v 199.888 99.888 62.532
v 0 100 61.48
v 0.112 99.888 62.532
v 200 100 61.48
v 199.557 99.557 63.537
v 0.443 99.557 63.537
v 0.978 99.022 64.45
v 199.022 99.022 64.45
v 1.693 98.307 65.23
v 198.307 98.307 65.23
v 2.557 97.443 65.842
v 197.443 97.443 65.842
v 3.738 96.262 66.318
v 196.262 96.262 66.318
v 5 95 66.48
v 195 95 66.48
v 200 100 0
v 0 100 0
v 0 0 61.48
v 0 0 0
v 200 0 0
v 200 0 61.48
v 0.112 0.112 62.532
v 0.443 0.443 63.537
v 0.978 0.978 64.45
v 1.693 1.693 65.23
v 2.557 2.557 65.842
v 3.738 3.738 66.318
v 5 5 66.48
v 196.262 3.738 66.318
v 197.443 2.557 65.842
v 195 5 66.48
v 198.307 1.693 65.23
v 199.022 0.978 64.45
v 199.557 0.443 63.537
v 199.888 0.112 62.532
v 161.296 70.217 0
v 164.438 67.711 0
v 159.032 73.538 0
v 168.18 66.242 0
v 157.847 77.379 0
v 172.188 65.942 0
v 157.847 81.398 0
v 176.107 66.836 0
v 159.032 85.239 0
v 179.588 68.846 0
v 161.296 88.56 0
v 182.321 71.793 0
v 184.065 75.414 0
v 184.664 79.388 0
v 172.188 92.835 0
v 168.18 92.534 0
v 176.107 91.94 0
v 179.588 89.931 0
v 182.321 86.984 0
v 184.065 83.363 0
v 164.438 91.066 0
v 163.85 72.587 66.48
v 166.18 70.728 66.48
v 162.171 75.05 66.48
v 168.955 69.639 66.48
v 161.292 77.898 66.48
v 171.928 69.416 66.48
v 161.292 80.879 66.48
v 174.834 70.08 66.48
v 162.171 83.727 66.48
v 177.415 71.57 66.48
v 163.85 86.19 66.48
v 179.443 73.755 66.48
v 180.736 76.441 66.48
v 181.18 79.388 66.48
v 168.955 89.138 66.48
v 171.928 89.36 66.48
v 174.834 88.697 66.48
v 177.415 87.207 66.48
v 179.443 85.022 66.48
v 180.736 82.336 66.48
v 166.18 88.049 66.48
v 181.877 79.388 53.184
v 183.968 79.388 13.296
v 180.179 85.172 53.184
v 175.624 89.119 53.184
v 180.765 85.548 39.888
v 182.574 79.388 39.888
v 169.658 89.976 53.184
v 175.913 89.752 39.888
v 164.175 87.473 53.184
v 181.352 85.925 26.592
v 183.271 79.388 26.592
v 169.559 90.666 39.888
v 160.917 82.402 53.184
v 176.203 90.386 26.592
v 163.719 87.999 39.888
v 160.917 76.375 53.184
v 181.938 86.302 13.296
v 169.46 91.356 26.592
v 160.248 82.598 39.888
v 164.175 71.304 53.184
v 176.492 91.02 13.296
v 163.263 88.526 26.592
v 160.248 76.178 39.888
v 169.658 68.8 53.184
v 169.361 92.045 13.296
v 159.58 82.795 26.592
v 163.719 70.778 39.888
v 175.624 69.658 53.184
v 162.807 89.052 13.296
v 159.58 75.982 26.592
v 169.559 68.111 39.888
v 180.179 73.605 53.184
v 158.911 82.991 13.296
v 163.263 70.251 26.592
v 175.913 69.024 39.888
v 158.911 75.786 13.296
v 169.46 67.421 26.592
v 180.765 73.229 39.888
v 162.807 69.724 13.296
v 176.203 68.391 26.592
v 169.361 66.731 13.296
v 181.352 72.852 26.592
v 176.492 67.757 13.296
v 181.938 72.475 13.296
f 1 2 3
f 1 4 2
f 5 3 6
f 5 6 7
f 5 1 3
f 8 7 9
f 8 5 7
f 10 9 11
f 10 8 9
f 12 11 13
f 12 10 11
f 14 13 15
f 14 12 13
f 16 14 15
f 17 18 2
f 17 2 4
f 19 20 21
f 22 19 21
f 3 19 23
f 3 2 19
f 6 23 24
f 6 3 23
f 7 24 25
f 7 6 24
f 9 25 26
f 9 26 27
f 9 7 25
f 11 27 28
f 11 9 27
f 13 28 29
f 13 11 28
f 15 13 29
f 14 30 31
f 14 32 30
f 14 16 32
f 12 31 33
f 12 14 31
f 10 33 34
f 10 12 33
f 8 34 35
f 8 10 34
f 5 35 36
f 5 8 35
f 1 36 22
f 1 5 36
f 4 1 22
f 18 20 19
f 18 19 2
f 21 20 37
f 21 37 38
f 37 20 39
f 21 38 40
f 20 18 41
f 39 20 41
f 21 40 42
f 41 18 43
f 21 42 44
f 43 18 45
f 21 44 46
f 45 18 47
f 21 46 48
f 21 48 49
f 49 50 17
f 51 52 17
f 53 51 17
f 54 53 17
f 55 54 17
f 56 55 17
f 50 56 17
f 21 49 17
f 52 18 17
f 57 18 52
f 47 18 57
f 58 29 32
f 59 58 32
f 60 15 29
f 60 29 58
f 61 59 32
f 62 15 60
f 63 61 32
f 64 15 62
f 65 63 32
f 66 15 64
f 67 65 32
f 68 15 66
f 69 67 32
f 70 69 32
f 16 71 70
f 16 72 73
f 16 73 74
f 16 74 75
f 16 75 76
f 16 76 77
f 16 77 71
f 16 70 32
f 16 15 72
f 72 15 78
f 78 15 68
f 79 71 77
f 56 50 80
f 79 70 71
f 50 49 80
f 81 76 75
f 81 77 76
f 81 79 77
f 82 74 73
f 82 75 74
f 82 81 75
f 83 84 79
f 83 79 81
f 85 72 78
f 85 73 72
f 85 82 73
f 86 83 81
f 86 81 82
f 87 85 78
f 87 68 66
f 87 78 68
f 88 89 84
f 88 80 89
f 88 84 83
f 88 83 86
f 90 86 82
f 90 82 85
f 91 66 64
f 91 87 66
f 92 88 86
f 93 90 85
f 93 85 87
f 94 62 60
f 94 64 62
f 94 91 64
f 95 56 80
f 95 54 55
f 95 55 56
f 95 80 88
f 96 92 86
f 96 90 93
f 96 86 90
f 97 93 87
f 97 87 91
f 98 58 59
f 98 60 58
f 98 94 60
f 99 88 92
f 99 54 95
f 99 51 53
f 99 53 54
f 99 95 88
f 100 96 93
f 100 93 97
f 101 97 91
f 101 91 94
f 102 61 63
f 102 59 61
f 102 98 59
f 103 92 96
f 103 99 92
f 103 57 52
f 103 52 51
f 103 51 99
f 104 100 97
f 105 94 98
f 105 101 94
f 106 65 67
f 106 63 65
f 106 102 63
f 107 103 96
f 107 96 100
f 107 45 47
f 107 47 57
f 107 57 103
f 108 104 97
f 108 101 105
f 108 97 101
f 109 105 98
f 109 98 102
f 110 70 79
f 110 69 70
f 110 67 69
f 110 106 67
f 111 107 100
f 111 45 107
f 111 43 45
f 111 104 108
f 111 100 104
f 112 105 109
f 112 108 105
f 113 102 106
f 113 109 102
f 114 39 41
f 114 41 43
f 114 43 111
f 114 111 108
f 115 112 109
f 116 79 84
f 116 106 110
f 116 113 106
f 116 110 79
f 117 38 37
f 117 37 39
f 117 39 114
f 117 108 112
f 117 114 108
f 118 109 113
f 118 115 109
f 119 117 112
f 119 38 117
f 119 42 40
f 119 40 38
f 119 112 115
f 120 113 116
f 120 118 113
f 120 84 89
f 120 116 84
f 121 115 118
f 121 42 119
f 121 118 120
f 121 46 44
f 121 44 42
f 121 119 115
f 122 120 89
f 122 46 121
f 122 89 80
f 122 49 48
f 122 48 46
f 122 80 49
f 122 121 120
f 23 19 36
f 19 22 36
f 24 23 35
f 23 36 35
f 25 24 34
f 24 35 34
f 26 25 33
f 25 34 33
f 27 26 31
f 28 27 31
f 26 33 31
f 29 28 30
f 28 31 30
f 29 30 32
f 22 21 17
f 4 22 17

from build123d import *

# Parameters (mm, degrees)
F0_W     = 200
F0_H     = 100
F1_DEPTH = 66.47978
F2_R     = 10
F3_DEPTH = 66.48078
F3_TAPER = -3
F4_R     = 5


with BuildPart() as f1:
    # F0 (on Top) → F1 (new body)
    with BuildSketch(Plane.XY):
        with Locations((100, 50)):
            Rectangle(F0_W, F0_H)
    extrude(amount=F1_DEPTH)

    # F2 (on face) → F3 (cut, through all)
    with BuildSketch(Plane.XY.offset(66.47978)):
        with Locations((171.1803972721, 79.3884024024)):
            Circle(F2_R)
    extrude(amount=-F3_DEPTH, taper=F3_TAPER, mode=Mode.SUBTRACT)

    # F4
    f4_edges = [f1.edges().sort_by_distance(p)[0] for p in [
        (100, 100, 66.47978),
        (100, 0, 66.47978),
        (200, 50, 66.47978),
        (0, 50, 66.47978),
    ]]
    fillet(f4_edges, radius=F4_R)


solid = f1.part
